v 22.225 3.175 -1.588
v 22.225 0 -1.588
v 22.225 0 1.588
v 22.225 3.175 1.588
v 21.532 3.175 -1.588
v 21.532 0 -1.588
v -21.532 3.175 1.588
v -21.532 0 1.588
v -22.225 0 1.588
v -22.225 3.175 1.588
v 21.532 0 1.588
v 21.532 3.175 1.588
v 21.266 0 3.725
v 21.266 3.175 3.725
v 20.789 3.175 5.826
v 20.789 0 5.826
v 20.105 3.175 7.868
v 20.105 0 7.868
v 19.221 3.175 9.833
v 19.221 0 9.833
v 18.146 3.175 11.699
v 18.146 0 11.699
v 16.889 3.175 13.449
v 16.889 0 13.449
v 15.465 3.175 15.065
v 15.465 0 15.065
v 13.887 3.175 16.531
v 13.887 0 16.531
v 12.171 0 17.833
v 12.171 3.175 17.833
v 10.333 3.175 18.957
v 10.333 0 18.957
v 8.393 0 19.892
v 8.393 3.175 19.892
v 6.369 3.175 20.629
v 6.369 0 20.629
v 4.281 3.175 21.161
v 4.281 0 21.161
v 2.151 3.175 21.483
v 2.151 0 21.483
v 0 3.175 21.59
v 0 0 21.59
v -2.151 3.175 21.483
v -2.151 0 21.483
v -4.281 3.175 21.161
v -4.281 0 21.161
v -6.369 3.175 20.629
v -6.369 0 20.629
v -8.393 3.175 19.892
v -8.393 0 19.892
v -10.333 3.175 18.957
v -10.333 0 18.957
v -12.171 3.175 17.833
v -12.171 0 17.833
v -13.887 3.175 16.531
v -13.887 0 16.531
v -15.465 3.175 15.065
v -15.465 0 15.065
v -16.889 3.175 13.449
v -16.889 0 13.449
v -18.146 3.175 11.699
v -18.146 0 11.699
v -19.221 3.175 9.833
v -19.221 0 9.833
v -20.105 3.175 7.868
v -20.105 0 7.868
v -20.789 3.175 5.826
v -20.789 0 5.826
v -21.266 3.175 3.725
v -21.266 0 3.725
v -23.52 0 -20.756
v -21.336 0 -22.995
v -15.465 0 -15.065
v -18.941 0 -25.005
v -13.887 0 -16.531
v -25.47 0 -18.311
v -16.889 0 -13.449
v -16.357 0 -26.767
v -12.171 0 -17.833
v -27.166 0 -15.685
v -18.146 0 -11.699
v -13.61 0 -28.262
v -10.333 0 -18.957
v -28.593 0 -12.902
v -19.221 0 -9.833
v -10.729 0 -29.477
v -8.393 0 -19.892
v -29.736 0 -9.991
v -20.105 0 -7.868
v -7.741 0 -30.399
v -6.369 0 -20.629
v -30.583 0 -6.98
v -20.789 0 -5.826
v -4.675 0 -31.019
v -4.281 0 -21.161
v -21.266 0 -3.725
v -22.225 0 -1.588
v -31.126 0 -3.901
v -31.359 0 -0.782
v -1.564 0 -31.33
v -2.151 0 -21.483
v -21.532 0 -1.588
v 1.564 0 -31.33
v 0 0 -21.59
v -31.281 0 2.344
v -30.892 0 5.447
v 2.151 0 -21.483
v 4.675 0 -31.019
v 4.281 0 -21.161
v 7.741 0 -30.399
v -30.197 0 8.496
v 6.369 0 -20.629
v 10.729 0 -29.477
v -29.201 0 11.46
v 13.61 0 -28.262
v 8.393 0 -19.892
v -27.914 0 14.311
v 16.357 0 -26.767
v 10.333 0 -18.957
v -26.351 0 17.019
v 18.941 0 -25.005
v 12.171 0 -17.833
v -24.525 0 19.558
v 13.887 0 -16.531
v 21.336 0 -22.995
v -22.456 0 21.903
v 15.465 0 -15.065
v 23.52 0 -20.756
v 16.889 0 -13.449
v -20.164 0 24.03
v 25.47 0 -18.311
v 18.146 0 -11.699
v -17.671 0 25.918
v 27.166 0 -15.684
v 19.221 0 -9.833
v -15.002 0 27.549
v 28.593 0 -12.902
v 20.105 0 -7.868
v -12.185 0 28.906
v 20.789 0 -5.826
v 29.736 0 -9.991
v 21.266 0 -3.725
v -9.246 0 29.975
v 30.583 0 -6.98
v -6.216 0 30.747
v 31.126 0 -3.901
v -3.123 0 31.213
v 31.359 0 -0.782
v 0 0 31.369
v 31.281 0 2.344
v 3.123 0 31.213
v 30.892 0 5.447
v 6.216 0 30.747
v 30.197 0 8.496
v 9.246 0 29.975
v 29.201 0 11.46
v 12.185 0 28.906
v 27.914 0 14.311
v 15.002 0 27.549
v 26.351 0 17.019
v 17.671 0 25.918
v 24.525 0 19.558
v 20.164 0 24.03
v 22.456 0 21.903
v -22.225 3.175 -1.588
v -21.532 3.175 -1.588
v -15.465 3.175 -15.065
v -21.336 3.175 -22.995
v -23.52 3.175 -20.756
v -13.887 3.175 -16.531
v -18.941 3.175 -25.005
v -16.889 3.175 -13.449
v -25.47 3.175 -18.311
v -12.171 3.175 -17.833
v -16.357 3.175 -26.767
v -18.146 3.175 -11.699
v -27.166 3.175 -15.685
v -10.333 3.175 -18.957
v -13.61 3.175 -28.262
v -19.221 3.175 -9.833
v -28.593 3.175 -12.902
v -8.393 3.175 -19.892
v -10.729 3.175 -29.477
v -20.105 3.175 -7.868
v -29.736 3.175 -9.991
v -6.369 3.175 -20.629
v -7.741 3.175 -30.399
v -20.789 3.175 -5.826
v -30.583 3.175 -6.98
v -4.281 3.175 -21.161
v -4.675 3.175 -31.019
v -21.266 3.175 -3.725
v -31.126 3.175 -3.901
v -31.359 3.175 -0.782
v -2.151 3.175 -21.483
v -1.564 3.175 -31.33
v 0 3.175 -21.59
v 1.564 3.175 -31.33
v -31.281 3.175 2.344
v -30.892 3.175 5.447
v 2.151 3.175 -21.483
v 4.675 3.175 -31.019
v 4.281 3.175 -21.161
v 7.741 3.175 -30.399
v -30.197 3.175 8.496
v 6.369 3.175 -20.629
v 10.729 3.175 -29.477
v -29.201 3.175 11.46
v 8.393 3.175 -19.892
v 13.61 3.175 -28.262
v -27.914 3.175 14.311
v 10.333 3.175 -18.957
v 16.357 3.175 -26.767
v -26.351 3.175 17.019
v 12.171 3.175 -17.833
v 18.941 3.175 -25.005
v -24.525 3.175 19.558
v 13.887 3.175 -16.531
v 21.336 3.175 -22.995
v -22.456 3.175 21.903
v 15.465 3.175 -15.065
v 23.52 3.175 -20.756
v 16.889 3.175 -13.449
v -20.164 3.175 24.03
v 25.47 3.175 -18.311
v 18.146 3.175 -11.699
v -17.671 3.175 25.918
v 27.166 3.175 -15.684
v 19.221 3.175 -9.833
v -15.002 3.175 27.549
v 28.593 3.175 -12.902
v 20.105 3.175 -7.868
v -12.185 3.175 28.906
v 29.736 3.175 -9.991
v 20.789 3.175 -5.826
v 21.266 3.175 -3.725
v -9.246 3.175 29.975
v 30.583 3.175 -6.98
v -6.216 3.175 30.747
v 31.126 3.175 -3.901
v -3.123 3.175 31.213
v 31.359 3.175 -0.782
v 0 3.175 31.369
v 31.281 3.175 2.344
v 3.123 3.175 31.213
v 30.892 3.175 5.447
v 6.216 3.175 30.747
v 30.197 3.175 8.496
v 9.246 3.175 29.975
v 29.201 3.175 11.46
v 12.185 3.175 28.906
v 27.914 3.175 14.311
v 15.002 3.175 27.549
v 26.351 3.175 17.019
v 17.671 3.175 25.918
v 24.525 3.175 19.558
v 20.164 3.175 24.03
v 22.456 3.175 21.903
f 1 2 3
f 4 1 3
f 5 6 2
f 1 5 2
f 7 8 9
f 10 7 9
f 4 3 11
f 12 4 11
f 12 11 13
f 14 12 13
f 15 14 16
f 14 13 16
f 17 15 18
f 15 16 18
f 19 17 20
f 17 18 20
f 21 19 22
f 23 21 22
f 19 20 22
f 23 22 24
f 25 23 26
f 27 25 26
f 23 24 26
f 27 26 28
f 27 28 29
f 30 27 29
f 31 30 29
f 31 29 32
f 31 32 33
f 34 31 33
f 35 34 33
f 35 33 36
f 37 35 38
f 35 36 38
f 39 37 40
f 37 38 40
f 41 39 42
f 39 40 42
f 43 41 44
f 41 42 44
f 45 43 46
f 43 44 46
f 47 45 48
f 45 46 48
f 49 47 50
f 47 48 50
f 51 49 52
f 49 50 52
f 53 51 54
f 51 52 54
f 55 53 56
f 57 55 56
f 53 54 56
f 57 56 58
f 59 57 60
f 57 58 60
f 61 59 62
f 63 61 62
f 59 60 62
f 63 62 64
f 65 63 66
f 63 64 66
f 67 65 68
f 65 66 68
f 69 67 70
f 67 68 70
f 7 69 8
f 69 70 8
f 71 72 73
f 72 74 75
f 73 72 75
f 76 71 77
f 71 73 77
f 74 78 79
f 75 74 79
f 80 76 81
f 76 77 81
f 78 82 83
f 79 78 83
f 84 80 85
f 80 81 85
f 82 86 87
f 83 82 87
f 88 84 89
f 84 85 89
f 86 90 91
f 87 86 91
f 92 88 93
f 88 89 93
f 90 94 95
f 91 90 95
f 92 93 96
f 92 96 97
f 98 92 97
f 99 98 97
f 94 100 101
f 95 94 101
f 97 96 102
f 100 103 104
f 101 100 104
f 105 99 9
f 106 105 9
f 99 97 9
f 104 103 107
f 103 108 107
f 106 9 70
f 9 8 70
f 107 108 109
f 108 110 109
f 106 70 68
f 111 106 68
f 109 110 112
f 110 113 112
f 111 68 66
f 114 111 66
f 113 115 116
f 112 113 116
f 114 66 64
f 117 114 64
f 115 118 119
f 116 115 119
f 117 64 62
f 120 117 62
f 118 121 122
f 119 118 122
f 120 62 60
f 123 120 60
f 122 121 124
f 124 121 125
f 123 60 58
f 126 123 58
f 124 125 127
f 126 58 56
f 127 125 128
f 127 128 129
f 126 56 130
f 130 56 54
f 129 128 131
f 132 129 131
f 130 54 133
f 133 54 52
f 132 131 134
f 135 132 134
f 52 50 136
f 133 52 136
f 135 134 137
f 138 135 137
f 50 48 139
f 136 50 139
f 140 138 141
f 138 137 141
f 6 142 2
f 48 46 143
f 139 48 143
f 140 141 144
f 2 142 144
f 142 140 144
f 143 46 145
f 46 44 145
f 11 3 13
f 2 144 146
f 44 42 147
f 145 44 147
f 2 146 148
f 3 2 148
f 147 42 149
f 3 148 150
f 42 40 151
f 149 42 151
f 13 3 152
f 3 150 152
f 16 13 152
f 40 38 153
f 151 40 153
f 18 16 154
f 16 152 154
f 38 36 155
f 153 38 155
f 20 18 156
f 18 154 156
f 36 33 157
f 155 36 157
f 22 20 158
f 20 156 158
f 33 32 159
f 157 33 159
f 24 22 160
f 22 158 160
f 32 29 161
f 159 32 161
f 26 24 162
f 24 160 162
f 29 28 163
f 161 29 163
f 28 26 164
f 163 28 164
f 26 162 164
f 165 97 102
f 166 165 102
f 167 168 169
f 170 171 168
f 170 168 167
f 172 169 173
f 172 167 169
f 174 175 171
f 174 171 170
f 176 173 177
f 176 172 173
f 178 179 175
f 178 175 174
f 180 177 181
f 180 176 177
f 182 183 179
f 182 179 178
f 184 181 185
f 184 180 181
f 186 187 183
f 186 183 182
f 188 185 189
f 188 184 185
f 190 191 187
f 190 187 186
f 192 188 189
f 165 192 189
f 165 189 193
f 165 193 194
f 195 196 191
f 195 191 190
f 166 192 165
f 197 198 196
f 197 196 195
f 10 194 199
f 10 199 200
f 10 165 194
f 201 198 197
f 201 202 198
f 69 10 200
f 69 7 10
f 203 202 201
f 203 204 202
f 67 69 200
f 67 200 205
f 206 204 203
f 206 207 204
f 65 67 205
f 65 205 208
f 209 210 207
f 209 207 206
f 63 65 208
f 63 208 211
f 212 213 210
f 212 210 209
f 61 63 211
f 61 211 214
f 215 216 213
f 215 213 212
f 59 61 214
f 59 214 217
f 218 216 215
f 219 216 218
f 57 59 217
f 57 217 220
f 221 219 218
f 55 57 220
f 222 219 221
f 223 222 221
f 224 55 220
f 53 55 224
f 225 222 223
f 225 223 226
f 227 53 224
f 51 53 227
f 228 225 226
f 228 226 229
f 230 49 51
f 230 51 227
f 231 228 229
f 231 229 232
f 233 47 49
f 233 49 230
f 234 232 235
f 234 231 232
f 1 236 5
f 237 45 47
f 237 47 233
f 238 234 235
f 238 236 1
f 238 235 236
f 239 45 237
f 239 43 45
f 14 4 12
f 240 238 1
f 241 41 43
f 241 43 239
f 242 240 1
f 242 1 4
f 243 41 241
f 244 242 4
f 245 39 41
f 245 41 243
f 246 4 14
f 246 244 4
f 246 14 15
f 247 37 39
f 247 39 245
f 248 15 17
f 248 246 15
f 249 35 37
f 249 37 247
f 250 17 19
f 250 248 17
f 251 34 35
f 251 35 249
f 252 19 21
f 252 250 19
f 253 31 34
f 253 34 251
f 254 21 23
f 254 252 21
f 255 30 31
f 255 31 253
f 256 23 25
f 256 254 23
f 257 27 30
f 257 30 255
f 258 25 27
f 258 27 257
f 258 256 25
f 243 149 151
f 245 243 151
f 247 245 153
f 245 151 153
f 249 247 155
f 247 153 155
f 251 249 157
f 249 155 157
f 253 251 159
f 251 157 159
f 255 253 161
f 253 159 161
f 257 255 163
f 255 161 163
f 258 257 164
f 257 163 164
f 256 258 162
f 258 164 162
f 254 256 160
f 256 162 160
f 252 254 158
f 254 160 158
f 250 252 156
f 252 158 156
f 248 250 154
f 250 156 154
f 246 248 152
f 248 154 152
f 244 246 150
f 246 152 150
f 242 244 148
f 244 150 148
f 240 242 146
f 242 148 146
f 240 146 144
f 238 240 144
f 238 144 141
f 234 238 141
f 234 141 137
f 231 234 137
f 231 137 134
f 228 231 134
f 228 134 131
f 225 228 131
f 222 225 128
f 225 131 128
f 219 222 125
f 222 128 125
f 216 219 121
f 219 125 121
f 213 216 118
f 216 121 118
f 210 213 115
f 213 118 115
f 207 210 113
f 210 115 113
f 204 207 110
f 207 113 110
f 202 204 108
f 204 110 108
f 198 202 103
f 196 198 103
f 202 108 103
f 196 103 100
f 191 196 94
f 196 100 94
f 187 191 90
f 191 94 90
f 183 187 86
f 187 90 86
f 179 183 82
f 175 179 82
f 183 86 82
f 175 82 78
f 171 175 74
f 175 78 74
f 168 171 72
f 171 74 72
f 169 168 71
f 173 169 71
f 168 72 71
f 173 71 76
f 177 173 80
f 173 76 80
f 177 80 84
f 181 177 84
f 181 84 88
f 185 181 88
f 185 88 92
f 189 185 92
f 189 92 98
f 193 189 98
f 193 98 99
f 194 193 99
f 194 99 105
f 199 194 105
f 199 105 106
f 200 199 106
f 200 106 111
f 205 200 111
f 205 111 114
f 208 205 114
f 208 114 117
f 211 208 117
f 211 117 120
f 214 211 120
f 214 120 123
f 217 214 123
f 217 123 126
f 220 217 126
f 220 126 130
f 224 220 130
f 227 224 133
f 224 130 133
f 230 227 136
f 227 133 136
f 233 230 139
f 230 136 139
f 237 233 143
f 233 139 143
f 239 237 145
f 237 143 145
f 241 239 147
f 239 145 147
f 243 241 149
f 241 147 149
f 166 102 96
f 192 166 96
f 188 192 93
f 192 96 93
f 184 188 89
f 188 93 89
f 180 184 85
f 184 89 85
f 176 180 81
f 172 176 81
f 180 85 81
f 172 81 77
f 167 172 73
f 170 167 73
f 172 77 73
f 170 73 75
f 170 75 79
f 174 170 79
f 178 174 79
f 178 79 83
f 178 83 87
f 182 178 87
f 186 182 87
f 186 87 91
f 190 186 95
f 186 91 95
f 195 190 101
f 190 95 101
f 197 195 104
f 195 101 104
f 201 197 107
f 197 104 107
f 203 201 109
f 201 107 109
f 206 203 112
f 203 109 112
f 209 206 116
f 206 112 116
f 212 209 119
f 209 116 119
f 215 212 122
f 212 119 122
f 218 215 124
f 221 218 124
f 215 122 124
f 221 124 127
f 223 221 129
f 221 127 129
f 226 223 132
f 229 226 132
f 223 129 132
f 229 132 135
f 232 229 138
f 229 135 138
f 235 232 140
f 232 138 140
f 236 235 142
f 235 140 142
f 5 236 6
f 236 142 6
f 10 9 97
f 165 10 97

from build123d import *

# Parameters (mm, degrees)
SKETCH1_R           = 31.369
BOSS_EXTRUDE1_DEPTH = 3.175


with BuildPart() as part:
    # Sketch1 → Boss-Extrude1 (new body)
    with BuildSketch(Plane(origin=(0, 0, 0), x_dir=(1, 0, 0), z_dir=(0, 1, 0))):
        with Locations(Location((0, 0, 0), (0, 0, 270))):
            Circle(SKETCH1_R)
        with BuildLine():
            Line((-22.225, 1.5875), (-21.531556928, 1.5875))
            ThreePointArc((-21.531556928, 1.5875), (0, 21.59), (21.531556928, 1.5875))
            Line((21.531556928, 1.5875), (22.225, 1.5875))
            Line((22.225, 1.5875), (22.225, -1.5875))
            Line((22.225, -1.5875), (21.531556928, -1.5875))
            ThreePointArc((21.531556928, -1.5875), (0, -21.59), (-21.531556928, -1.5875))
            Line((-21.531556928, -1.5875), (-22.225, -1.5875))
            Line((-22.225, -1.5875), (-22.225, 1.5875))
        make_face(mode=Mode.SUBTRACT)
    extrude(amount=BOSS_EXTRUDE1_DEPTH)


solid = part.part
